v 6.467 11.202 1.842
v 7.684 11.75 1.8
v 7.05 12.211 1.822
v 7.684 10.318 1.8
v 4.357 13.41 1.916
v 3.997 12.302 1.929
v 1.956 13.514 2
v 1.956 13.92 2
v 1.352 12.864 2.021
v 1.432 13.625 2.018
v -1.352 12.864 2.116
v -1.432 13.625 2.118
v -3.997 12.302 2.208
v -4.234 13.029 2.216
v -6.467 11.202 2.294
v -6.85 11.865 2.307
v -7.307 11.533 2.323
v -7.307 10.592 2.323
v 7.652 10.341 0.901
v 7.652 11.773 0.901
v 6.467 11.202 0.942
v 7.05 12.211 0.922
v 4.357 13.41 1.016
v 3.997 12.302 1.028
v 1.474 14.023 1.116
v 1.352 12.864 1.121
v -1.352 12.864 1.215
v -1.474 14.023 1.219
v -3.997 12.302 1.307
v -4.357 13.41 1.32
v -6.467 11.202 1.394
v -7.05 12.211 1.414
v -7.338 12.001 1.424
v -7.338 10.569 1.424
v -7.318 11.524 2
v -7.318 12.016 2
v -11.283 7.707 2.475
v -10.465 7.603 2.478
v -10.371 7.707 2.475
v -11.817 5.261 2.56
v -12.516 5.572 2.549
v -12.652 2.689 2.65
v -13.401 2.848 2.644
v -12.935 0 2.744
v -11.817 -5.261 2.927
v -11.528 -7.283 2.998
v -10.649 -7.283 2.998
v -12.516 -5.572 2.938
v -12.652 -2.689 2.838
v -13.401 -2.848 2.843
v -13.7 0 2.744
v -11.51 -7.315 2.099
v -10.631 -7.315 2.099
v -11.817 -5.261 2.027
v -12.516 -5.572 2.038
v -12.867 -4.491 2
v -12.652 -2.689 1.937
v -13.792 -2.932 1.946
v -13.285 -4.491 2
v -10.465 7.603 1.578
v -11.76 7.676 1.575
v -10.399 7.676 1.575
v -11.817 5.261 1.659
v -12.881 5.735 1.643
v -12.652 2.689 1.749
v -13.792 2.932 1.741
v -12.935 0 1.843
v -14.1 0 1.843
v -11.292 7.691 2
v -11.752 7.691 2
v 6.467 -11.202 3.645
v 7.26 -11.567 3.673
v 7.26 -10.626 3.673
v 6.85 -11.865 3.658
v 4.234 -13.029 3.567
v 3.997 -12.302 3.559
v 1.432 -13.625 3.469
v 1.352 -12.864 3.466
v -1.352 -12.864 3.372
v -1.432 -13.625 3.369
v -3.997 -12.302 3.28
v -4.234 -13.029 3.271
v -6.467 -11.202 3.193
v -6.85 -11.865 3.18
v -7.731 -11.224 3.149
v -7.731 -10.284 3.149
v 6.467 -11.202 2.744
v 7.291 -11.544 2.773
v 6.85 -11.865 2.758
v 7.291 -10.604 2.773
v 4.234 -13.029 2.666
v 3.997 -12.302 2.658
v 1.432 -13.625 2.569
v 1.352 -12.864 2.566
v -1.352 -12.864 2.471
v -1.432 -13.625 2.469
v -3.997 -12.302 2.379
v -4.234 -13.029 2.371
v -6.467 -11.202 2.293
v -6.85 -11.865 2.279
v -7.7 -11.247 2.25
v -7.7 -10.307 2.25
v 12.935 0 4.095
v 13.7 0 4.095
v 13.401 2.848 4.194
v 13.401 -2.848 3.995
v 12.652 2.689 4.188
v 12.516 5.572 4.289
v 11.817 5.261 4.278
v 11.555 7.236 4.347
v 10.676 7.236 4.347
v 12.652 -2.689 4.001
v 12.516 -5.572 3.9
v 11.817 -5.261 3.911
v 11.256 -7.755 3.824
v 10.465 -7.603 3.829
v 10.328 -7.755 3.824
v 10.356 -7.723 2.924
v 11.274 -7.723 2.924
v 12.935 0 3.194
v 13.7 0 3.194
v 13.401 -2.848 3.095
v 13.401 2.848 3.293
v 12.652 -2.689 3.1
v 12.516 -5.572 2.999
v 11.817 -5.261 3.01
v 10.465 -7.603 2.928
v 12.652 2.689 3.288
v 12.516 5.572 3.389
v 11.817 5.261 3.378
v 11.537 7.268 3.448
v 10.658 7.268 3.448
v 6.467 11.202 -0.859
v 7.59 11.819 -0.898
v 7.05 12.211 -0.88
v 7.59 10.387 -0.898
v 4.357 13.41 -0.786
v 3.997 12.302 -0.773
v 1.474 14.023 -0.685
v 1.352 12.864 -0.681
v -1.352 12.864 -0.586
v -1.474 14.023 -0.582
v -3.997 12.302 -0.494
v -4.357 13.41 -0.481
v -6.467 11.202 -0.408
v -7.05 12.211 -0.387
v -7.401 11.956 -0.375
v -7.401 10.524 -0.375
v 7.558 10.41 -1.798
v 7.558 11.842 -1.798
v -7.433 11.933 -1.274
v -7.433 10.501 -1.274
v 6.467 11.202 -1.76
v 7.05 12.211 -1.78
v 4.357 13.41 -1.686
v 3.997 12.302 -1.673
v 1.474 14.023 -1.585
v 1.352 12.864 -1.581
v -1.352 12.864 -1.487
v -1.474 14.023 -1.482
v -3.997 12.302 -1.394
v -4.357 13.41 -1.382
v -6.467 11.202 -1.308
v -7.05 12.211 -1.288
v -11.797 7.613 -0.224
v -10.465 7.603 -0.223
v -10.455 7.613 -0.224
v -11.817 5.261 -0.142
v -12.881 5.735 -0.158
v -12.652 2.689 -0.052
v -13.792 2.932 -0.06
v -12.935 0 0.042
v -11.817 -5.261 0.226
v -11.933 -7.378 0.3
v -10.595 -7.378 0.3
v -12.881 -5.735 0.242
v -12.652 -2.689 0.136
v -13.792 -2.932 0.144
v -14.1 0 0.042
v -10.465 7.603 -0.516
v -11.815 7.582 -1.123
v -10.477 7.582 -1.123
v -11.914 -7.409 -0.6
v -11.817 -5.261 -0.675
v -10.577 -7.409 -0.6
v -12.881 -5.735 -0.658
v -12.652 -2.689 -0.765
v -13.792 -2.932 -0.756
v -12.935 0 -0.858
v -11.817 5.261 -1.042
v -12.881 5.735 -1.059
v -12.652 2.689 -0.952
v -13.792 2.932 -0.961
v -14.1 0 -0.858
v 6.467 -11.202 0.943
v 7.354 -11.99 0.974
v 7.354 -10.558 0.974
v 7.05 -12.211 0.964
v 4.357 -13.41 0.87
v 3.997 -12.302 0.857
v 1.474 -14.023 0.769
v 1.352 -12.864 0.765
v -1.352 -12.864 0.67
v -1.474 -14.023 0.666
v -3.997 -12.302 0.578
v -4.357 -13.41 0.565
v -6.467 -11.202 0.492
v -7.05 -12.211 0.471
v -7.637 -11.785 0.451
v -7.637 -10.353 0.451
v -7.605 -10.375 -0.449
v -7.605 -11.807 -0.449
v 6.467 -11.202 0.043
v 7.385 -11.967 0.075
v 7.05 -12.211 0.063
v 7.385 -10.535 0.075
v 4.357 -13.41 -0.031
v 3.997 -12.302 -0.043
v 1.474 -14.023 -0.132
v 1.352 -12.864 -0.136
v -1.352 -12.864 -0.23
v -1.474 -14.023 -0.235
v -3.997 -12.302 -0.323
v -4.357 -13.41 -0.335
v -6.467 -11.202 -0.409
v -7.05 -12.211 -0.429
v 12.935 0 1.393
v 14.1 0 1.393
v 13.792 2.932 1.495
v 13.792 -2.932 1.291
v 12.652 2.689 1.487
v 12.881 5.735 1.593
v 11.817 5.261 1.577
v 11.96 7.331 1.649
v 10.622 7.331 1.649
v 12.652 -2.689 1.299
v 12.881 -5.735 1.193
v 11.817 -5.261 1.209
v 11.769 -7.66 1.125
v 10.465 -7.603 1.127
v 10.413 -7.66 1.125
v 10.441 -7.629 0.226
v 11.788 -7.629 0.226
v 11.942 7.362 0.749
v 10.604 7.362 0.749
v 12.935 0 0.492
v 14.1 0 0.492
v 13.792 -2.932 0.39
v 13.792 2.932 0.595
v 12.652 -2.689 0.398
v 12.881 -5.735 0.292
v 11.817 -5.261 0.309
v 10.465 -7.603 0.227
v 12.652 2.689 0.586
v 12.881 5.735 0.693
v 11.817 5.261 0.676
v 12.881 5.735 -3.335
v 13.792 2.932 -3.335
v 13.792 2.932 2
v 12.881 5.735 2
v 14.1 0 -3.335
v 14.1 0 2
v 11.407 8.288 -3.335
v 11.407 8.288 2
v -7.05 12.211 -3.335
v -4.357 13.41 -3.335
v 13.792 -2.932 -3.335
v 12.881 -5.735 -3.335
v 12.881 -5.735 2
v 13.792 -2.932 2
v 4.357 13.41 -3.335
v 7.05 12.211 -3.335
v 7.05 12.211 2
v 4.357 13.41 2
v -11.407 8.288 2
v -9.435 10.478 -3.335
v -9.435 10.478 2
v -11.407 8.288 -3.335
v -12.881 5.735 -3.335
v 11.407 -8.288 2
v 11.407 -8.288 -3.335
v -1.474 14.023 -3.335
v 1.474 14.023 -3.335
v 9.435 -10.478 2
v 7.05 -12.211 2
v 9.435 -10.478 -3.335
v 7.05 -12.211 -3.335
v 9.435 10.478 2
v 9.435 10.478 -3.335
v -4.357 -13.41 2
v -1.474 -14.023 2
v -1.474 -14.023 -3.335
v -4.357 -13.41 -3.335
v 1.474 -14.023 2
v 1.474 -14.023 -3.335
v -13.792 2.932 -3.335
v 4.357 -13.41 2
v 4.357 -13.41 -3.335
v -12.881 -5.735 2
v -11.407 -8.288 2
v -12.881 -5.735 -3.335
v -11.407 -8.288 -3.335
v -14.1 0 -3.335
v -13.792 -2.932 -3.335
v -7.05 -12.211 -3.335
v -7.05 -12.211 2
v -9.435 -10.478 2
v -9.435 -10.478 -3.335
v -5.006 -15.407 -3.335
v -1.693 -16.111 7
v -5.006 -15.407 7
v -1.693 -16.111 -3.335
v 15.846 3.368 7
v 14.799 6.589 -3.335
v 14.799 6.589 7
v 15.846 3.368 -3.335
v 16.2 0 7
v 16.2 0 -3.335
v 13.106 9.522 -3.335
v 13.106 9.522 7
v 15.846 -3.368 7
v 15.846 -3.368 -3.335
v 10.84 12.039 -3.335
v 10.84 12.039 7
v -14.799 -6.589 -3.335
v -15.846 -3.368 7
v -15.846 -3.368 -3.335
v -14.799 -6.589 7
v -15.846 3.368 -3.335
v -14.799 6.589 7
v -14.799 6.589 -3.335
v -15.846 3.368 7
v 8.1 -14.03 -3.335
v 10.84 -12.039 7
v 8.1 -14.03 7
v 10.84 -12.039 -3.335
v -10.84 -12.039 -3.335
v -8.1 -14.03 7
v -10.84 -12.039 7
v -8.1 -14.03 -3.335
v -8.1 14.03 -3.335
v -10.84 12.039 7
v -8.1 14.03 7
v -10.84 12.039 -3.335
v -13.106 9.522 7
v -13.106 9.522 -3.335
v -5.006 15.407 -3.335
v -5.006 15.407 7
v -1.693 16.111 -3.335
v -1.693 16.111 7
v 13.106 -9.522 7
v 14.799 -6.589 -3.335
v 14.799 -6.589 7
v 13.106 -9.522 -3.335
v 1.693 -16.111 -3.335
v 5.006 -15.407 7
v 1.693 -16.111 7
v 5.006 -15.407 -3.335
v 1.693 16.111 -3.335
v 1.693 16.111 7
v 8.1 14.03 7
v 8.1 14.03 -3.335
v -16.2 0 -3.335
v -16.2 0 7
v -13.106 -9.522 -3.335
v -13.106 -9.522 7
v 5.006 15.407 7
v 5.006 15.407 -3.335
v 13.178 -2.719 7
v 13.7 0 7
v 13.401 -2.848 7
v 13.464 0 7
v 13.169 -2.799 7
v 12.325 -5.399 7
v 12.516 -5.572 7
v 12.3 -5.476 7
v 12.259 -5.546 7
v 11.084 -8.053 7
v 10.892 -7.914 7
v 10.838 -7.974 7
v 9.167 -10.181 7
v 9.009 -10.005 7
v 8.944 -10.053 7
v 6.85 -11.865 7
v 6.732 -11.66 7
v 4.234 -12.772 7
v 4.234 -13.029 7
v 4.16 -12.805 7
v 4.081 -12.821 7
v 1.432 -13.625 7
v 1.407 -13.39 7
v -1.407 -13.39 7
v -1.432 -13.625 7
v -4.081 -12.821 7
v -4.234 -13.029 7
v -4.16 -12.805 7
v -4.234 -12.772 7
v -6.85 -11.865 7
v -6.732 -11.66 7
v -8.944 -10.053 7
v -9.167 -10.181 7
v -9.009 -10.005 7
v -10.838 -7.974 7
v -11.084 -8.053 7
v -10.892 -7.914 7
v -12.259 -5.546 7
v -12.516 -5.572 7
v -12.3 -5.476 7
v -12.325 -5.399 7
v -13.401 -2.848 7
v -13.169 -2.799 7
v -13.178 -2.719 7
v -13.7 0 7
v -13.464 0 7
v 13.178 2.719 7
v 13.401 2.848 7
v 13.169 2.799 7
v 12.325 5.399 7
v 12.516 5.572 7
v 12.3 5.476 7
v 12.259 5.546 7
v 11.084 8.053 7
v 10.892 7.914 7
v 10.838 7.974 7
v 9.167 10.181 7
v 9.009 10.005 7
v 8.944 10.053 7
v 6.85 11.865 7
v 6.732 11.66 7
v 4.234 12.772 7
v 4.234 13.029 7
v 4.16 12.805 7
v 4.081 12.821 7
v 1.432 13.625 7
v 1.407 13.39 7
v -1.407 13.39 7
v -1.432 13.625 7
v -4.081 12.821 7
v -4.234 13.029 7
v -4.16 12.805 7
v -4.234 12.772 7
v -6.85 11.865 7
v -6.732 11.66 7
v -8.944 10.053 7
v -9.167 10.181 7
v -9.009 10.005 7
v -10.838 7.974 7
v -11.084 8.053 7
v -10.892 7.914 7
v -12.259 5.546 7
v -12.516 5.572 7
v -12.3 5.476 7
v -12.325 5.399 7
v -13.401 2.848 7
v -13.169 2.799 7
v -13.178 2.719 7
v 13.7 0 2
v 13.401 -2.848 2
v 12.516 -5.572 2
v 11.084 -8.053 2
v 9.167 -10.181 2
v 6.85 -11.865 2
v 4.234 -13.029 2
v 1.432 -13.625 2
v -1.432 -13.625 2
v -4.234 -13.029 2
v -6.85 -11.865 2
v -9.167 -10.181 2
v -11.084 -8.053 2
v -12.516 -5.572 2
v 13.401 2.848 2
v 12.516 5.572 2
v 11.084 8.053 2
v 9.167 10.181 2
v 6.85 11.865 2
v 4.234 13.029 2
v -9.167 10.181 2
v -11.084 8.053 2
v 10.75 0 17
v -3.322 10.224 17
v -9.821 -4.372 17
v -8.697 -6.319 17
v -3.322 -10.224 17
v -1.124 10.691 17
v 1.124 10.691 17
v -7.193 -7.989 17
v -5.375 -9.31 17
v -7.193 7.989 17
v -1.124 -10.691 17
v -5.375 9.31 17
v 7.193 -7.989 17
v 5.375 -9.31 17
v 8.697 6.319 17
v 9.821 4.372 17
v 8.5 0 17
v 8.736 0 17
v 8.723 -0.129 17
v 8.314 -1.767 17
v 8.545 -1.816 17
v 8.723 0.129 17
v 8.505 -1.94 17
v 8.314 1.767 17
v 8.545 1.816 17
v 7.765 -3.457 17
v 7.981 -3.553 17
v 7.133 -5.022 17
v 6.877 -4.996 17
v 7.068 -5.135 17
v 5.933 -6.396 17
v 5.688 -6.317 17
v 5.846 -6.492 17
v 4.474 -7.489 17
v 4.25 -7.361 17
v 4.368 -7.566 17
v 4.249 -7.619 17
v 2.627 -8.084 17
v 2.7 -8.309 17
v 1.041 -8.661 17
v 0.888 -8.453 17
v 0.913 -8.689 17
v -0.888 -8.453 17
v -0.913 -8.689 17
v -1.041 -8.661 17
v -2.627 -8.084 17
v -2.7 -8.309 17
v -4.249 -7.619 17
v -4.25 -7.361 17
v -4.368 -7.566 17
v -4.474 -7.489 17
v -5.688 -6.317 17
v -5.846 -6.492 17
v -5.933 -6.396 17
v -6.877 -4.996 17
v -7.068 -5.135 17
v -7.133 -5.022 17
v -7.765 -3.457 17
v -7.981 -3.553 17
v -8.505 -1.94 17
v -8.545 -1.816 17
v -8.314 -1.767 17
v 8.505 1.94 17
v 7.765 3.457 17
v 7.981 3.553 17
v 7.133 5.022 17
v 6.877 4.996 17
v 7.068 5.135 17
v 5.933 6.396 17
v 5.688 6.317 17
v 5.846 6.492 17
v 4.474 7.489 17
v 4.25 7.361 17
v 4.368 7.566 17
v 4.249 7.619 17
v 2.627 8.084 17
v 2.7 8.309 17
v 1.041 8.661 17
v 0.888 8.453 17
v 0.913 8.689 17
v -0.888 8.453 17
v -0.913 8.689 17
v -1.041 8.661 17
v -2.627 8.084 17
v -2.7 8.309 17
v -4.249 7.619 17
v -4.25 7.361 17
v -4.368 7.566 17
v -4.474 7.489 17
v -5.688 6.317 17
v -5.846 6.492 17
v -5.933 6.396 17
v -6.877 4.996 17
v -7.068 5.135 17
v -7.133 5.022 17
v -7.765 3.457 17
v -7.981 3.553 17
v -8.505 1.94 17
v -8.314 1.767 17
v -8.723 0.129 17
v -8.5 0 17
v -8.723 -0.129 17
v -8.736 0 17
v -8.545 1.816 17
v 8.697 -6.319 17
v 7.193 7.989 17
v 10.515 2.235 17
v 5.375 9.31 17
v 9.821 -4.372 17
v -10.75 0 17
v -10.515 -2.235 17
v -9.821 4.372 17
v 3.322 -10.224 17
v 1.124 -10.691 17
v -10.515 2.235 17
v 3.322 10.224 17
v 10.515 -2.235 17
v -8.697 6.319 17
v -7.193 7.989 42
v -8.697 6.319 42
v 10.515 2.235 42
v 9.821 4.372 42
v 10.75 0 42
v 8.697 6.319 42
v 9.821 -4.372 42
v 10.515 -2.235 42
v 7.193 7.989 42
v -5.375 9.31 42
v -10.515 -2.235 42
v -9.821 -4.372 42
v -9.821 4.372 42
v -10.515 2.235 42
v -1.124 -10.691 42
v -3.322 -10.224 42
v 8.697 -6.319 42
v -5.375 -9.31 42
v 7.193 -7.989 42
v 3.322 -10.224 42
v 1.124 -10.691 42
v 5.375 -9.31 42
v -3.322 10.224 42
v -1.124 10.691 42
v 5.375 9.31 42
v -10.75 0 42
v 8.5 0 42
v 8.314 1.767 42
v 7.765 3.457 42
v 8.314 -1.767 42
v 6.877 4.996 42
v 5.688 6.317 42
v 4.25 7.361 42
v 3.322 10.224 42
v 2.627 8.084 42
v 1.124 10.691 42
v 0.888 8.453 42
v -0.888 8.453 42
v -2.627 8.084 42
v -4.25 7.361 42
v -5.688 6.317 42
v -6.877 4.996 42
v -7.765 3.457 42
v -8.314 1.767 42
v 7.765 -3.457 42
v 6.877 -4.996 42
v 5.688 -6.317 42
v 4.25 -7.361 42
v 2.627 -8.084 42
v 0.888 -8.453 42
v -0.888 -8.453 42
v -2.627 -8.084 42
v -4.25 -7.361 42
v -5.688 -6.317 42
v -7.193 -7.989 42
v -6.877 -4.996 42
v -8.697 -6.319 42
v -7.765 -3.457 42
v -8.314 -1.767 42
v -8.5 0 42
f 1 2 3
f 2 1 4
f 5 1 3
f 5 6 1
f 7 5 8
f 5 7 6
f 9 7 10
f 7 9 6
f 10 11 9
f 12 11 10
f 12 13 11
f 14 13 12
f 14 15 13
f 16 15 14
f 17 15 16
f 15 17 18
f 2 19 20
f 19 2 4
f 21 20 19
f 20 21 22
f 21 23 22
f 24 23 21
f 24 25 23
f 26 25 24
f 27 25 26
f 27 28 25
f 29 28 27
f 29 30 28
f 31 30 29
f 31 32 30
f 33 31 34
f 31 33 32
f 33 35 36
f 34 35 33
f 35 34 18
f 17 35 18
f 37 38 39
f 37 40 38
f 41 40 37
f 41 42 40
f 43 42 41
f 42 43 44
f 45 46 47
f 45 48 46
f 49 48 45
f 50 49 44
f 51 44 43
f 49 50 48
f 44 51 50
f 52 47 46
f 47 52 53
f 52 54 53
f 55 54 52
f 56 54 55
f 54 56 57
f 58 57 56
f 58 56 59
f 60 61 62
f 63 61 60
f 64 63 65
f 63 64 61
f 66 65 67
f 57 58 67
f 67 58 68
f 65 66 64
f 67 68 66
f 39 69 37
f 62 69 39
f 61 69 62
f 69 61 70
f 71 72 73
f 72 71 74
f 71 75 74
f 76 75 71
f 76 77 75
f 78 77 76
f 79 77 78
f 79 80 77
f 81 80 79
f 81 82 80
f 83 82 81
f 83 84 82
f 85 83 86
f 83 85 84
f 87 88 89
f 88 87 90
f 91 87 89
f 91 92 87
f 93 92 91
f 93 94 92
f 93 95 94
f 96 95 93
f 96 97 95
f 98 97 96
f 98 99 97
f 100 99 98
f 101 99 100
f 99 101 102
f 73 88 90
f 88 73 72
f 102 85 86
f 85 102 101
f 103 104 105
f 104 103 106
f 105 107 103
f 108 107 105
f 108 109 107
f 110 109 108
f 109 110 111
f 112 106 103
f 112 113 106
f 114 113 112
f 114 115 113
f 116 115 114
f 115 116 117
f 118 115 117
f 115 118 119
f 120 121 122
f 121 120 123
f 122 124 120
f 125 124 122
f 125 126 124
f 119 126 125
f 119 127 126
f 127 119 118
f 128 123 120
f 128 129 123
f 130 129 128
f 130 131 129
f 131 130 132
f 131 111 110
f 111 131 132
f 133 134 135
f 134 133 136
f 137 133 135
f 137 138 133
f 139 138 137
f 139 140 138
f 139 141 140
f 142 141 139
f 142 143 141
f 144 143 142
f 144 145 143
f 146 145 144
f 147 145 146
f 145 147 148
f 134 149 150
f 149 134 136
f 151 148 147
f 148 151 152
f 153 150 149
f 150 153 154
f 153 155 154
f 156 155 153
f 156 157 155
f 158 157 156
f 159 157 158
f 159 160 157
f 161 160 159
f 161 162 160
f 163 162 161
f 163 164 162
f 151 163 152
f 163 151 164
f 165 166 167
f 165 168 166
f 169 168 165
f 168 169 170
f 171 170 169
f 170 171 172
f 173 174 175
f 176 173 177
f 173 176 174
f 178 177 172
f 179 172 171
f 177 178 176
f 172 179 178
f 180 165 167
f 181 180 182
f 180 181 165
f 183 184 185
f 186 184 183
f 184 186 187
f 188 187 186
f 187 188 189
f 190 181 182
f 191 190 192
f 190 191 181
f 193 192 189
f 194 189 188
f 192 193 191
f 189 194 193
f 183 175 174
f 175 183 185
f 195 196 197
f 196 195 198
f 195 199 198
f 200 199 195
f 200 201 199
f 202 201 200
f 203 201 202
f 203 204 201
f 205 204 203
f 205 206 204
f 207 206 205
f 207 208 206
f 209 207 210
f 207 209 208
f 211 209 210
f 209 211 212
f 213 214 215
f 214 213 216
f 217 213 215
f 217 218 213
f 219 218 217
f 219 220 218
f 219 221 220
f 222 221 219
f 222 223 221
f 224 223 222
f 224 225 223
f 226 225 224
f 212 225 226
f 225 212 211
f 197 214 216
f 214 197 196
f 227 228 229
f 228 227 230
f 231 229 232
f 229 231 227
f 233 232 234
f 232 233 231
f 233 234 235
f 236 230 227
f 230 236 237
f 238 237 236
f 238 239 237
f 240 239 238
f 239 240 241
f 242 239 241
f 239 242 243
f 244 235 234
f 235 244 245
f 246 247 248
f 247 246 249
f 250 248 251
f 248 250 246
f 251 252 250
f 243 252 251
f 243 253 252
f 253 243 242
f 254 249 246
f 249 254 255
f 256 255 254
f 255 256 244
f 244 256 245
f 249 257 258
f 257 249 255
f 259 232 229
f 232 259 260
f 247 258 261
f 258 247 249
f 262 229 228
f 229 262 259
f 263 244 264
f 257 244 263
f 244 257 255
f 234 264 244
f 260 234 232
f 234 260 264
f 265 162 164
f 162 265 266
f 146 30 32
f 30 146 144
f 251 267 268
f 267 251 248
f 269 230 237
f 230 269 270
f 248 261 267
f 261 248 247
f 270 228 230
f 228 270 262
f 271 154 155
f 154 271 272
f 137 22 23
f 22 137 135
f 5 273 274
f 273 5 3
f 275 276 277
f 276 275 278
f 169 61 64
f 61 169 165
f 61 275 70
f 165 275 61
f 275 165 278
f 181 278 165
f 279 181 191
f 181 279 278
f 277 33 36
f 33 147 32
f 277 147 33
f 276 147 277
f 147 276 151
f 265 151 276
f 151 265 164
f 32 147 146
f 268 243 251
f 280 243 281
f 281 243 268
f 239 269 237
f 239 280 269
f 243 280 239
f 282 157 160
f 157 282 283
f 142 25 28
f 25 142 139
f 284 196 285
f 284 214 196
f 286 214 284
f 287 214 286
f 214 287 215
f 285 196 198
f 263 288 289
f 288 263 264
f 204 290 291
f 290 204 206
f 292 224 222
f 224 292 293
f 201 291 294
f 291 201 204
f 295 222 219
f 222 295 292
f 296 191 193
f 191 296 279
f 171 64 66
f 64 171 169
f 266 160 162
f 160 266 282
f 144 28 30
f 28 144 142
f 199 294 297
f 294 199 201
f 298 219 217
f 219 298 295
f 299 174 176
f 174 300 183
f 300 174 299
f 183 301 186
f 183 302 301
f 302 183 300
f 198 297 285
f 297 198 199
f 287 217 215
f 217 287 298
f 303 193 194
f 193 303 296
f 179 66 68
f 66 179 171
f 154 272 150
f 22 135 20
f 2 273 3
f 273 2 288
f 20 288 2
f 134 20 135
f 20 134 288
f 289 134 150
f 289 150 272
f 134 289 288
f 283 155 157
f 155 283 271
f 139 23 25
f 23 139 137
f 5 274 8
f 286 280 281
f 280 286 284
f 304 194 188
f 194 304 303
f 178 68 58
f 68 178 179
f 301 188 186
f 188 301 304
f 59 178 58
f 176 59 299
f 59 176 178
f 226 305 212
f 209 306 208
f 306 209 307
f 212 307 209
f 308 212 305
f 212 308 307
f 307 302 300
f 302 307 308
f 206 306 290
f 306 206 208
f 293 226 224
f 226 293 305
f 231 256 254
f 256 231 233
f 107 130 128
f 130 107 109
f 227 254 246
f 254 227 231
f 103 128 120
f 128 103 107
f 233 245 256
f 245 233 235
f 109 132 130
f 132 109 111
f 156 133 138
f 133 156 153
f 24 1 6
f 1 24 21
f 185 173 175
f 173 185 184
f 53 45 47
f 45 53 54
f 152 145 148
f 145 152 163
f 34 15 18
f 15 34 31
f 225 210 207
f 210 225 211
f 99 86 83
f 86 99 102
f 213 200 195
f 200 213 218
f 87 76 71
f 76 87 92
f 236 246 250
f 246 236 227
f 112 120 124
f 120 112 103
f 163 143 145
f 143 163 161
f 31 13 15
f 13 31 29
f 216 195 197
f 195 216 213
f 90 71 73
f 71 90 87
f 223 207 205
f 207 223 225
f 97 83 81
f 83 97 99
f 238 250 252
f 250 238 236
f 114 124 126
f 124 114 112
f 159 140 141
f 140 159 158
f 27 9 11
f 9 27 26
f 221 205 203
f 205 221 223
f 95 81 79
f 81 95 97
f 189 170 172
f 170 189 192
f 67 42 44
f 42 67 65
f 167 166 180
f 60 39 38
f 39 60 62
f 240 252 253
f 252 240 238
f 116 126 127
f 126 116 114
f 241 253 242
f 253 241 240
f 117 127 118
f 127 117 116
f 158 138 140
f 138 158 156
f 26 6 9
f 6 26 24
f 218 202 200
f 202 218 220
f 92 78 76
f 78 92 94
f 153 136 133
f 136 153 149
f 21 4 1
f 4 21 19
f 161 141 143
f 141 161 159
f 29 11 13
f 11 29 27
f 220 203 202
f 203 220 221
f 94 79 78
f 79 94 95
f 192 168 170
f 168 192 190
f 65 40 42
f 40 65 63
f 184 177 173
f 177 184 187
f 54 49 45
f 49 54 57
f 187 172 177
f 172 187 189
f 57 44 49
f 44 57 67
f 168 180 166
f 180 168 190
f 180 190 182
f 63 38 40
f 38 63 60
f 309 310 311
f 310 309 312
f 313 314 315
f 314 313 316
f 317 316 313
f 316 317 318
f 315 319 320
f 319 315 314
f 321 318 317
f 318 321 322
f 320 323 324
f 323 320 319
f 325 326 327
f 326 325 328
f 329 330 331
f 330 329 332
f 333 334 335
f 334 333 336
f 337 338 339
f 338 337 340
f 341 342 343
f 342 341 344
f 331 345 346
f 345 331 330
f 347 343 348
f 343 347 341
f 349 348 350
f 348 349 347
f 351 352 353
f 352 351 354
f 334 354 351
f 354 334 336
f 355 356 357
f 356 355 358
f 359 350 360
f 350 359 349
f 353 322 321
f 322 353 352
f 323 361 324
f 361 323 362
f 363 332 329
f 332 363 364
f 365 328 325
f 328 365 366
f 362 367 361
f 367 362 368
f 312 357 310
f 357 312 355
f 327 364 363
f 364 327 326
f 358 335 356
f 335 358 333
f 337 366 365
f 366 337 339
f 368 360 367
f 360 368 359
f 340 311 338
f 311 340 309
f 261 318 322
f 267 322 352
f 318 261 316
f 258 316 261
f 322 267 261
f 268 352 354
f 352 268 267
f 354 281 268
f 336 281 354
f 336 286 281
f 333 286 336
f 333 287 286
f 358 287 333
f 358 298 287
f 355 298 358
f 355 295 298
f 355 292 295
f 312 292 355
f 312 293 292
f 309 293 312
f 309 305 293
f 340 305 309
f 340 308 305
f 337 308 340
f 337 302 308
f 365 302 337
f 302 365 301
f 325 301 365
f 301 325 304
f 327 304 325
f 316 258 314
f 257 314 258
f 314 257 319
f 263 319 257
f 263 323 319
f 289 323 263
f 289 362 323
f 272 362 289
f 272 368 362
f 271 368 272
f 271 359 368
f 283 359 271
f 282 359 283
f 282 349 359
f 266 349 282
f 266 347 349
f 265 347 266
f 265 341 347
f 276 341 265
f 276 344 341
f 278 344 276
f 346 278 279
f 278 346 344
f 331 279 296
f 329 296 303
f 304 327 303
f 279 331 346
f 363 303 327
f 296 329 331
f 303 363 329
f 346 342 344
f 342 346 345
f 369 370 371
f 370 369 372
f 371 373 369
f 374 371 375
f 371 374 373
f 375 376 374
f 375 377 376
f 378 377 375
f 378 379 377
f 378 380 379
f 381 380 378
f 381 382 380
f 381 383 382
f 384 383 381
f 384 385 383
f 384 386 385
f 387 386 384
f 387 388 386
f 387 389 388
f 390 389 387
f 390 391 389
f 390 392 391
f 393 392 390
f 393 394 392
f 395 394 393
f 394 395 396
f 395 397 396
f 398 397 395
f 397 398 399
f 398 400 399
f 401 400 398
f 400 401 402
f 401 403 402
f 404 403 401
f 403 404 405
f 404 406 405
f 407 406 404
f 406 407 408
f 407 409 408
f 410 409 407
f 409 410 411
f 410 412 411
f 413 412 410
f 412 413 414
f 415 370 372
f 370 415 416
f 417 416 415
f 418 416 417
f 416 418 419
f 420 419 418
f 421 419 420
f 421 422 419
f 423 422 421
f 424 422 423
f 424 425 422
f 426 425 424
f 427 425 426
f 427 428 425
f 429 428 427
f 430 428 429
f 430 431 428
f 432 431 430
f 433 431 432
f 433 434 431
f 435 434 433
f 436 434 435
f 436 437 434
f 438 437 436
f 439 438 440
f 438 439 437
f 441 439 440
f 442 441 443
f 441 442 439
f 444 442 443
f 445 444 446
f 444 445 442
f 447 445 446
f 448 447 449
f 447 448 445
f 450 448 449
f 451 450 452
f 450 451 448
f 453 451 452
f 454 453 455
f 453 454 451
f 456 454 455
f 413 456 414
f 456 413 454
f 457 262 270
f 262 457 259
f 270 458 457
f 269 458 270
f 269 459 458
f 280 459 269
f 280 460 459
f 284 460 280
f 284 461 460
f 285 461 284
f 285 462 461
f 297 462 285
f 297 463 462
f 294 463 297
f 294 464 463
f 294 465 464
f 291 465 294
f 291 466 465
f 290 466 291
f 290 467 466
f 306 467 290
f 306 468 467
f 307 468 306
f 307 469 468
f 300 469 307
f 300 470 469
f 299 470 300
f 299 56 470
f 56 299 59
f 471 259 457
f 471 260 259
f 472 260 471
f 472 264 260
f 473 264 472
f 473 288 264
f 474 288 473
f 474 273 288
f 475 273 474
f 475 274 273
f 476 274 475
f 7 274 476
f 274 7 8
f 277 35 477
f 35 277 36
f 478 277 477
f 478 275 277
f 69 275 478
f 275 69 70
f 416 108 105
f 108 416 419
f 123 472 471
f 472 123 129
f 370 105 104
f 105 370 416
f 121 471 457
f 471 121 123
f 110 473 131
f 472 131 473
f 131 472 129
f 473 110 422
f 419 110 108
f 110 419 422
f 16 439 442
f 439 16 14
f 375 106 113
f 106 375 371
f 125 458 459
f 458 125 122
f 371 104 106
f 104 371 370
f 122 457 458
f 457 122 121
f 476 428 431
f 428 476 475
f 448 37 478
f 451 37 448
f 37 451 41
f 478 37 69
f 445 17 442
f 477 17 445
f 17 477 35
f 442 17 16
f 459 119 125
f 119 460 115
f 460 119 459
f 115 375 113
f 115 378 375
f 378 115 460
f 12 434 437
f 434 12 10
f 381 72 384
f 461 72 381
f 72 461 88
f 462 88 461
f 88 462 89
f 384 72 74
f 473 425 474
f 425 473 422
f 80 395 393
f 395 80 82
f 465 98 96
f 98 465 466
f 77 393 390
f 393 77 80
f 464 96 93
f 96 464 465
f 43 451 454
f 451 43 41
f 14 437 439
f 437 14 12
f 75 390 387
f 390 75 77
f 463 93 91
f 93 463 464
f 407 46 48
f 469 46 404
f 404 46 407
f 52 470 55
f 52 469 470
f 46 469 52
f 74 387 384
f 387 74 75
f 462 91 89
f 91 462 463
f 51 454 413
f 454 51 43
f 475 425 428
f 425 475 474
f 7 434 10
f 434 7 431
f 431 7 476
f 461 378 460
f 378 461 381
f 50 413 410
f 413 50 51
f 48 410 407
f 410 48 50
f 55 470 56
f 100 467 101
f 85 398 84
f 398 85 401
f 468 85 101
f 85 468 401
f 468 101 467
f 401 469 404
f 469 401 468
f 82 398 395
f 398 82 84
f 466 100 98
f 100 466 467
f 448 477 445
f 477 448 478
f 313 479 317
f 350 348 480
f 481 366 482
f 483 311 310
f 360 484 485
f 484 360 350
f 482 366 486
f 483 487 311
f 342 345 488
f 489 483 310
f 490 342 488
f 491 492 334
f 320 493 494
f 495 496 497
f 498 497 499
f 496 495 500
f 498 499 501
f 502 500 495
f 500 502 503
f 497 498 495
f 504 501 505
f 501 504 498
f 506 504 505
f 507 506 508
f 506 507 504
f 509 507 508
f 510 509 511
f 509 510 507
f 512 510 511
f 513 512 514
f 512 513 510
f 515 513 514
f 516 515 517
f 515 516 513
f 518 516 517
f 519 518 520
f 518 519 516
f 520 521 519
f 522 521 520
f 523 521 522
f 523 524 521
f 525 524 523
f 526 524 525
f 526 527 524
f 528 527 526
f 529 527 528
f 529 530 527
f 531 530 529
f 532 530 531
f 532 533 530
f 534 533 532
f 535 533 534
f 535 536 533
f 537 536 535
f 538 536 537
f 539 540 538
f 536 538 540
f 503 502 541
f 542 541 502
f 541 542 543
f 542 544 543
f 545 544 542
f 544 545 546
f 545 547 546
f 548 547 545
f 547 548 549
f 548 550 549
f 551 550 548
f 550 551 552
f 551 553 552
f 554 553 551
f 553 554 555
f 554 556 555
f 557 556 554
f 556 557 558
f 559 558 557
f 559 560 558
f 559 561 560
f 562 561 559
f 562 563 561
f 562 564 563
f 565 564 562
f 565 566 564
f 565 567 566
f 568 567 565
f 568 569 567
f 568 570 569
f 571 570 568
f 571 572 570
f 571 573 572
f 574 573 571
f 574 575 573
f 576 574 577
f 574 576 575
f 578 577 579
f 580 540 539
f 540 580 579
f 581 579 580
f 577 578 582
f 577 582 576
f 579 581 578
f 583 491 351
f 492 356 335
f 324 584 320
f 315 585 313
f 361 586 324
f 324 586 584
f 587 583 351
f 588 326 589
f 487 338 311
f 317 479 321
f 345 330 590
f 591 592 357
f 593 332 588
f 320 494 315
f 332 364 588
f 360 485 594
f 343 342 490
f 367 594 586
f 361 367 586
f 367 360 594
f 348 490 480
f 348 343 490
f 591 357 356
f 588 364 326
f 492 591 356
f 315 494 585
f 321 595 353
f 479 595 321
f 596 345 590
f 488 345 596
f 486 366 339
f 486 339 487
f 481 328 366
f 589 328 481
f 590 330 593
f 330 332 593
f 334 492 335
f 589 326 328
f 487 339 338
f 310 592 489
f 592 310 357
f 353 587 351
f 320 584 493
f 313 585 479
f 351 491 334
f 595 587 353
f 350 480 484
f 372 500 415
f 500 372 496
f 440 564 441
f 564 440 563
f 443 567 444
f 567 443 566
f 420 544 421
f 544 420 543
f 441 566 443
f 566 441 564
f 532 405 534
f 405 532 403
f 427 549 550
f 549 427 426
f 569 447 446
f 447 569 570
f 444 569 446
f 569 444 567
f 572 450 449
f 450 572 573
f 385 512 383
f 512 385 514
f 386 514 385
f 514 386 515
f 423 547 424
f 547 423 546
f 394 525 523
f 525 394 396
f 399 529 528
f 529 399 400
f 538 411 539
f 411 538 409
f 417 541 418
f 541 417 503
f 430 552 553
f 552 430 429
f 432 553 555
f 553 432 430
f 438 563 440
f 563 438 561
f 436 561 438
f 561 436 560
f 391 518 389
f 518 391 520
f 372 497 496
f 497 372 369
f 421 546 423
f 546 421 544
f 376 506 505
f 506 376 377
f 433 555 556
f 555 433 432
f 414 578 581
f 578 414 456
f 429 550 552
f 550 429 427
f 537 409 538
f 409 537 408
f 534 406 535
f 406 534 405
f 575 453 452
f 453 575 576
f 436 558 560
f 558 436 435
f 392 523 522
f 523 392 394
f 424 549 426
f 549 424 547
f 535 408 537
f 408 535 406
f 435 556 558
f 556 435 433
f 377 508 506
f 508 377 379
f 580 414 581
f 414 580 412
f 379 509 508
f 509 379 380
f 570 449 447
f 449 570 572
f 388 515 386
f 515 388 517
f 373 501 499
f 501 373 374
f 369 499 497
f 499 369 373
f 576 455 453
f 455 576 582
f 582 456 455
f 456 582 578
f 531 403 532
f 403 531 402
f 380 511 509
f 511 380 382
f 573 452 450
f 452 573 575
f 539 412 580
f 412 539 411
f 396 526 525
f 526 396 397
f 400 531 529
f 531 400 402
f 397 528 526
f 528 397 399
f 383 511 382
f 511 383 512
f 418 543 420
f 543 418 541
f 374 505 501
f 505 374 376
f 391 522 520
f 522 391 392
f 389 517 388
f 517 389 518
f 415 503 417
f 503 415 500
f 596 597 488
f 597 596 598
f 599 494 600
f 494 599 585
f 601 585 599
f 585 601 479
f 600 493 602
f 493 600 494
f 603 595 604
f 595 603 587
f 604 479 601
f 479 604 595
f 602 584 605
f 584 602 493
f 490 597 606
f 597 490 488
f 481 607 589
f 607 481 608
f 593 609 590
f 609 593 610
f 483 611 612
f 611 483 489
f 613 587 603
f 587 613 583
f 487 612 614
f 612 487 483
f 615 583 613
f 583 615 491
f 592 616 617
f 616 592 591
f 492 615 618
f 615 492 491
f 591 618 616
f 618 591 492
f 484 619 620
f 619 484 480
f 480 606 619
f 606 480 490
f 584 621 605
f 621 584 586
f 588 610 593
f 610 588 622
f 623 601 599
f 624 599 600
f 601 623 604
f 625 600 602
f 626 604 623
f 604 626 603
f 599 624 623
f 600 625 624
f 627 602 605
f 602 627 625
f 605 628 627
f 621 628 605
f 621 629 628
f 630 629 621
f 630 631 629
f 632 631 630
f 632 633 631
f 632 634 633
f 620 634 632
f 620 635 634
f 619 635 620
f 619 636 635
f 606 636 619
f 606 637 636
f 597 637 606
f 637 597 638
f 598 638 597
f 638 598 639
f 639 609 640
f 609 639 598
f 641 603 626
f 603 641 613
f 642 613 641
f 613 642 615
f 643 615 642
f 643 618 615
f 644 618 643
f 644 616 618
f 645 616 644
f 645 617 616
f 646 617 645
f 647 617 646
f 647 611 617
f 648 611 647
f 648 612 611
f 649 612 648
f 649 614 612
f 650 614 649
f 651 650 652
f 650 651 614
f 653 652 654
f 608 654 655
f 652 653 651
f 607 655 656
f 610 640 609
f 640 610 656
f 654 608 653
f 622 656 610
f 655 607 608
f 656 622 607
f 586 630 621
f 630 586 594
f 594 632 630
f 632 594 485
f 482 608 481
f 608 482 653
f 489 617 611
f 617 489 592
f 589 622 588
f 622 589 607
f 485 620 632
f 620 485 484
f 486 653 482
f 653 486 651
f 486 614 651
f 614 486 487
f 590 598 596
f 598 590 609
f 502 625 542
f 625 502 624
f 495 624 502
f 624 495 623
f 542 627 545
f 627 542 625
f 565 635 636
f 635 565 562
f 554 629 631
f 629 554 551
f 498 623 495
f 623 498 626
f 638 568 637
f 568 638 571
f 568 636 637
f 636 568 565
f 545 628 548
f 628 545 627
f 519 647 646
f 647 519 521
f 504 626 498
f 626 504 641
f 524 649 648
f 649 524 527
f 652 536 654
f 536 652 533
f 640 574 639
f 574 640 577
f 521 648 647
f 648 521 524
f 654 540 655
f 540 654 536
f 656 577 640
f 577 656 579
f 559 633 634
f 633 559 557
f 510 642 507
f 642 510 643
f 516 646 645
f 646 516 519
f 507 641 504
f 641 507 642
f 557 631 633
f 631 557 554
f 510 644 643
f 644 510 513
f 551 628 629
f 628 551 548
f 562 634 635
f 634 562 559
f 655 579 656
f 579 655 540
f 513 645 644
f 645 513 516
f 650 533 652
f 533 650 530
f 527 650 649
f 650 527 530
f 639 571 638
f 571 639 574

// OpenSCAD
// Credit to Laird Popkin and his 3D Model "2 Liter Bottle Holder with Funnel and Cap". In accordance with his license, this is licensed under CC-BY-SA 4.0. 
//Other than the threaded bottle holder, this was designed by Lucas Gelfond.

//Adapter parameters

//What size to adapt to, OD.
adapterToOD = 21.5;
//What size to adapt to, ID.
adapterToID = 17;
//Flat adapter length - the length of the adapter before it begins to convert.
flatAdapterLen = 5;
//Conversion adapter length - the length of the adapter as it converts the bottle to a certain size. 
convertAdapterLen = 10;
//Flat adapter length after conversion.
flatAdapterLen2 =25;
//Overlap
overlap = 1;
// resolution
sfn = 30;

clearance=0.4; // tune to get the right 'fit' for your printer

// Bottle params
bottleID=25.07;
bottleOD=27.4;
bottlePitch=2.7;
bottleHeight=9;
bottleAngle=2;
threadLen=15;

// holder params
holderOD=bottleOD+5;

// Bottle Computations
thickness = bottleOD-bottleID;
threadHeight = bottlePitch/3;
echo("thread height ",threadHeight);
echo("thread depth ",(bottleOD-bottleID)/2);

module thread() {
    cube([threadLen,bottleOD,threadHeight]);
}

module bottleNeck() {
	difference() {
		union() {
			translate([0,0,overlap/-2]) cylinder(r=bottleOD/2+clearance,h=bottleHeight+overlap);
			}
		union() {
            //The top row of threads. Rotates and moves them all a set distance.
            for (i = [0:3]) {
                    rotate([0, bottleAngle, i*90]) translate([threadLen/-2, 0, bottleHeight/2+(i*bottlePitch/4)]) thread();
                }
            //The bottom row of threads. Rotates and moves them all a set distance.
             for (i = [0:3]) {
                   rotate([0, bottleAngle, i*90]) translate([threadLen/-2, 0, bottleHeight/2+(i*bottlePitch/4)-bottlePitch]) thread();
              }
        }
	}
	translate([0,0,-overlap/2]) cylinder(r=bottleID/2+clearance,h=bottleHeight+overlap);
}

module bottleHolder() {
	difference() {
		cylinder(r=holderOD/2,h=bottleHeight);
		bottleNeck();
		}
	}


module adaptation() {
    difference() {
        union() {
           translate([0,0,(bottleHeight-thickness)/-2]) {
            bottleHolder();
           }
           translate([0,0,bottleHeight/2]) {
              difference() {
                  cylinder(r=holderOD/2, h=flatAdapterLen, $fn=sfn, center=true); 
                  cylinder(r=bottleOD/2, h=flatAdapterLen+1, $fn=sfn, center=true); 
              }
           }
           translate([0,0,(bottleHeight+flatAdapterLen+convertAdapterLen)/2]) {
               cylinder(r1 = holderOD/2, r2 = adapterToOD/2, h=convertAdapterLen, center=true, $fn=sfn);
           }
       }
        translate([0,0,(bottleHeight+flatAdapterLen+convertAdapterLen)/2]) {
               cylinder(r1 = bottleOD/2, r2 = adapterToID/2, h=convertAdapterLen+1, center=true, $fn=sfn);
        }
    }
}

module extension() {
    difference() {
        union() {
            adaptation();
            // why does /in by 12 work?
            translate([0,0,bottleHeight/2+flatAdapterLen/2+convertAdapterLen+flatAdapterLen2/2]) {
                cylinder(r=adapterToOD/2, h=flatAdapterLen2, $fn=sfn, center=true);
            }
        }
        translate([0,0,bottleHeight/2+flatAdapterLen/2+convertAdapterLen+flatAdapterLen2/2]) cylinder(r=adapterToID/2, h=flatAdapterLen2+1, $fn=sfn, center=true);
    }
}
echo("z raise", (bottleHeight/2+flatAdapterLen+convertAdapterLen+flatAdapterLen2)/2);

extension();
